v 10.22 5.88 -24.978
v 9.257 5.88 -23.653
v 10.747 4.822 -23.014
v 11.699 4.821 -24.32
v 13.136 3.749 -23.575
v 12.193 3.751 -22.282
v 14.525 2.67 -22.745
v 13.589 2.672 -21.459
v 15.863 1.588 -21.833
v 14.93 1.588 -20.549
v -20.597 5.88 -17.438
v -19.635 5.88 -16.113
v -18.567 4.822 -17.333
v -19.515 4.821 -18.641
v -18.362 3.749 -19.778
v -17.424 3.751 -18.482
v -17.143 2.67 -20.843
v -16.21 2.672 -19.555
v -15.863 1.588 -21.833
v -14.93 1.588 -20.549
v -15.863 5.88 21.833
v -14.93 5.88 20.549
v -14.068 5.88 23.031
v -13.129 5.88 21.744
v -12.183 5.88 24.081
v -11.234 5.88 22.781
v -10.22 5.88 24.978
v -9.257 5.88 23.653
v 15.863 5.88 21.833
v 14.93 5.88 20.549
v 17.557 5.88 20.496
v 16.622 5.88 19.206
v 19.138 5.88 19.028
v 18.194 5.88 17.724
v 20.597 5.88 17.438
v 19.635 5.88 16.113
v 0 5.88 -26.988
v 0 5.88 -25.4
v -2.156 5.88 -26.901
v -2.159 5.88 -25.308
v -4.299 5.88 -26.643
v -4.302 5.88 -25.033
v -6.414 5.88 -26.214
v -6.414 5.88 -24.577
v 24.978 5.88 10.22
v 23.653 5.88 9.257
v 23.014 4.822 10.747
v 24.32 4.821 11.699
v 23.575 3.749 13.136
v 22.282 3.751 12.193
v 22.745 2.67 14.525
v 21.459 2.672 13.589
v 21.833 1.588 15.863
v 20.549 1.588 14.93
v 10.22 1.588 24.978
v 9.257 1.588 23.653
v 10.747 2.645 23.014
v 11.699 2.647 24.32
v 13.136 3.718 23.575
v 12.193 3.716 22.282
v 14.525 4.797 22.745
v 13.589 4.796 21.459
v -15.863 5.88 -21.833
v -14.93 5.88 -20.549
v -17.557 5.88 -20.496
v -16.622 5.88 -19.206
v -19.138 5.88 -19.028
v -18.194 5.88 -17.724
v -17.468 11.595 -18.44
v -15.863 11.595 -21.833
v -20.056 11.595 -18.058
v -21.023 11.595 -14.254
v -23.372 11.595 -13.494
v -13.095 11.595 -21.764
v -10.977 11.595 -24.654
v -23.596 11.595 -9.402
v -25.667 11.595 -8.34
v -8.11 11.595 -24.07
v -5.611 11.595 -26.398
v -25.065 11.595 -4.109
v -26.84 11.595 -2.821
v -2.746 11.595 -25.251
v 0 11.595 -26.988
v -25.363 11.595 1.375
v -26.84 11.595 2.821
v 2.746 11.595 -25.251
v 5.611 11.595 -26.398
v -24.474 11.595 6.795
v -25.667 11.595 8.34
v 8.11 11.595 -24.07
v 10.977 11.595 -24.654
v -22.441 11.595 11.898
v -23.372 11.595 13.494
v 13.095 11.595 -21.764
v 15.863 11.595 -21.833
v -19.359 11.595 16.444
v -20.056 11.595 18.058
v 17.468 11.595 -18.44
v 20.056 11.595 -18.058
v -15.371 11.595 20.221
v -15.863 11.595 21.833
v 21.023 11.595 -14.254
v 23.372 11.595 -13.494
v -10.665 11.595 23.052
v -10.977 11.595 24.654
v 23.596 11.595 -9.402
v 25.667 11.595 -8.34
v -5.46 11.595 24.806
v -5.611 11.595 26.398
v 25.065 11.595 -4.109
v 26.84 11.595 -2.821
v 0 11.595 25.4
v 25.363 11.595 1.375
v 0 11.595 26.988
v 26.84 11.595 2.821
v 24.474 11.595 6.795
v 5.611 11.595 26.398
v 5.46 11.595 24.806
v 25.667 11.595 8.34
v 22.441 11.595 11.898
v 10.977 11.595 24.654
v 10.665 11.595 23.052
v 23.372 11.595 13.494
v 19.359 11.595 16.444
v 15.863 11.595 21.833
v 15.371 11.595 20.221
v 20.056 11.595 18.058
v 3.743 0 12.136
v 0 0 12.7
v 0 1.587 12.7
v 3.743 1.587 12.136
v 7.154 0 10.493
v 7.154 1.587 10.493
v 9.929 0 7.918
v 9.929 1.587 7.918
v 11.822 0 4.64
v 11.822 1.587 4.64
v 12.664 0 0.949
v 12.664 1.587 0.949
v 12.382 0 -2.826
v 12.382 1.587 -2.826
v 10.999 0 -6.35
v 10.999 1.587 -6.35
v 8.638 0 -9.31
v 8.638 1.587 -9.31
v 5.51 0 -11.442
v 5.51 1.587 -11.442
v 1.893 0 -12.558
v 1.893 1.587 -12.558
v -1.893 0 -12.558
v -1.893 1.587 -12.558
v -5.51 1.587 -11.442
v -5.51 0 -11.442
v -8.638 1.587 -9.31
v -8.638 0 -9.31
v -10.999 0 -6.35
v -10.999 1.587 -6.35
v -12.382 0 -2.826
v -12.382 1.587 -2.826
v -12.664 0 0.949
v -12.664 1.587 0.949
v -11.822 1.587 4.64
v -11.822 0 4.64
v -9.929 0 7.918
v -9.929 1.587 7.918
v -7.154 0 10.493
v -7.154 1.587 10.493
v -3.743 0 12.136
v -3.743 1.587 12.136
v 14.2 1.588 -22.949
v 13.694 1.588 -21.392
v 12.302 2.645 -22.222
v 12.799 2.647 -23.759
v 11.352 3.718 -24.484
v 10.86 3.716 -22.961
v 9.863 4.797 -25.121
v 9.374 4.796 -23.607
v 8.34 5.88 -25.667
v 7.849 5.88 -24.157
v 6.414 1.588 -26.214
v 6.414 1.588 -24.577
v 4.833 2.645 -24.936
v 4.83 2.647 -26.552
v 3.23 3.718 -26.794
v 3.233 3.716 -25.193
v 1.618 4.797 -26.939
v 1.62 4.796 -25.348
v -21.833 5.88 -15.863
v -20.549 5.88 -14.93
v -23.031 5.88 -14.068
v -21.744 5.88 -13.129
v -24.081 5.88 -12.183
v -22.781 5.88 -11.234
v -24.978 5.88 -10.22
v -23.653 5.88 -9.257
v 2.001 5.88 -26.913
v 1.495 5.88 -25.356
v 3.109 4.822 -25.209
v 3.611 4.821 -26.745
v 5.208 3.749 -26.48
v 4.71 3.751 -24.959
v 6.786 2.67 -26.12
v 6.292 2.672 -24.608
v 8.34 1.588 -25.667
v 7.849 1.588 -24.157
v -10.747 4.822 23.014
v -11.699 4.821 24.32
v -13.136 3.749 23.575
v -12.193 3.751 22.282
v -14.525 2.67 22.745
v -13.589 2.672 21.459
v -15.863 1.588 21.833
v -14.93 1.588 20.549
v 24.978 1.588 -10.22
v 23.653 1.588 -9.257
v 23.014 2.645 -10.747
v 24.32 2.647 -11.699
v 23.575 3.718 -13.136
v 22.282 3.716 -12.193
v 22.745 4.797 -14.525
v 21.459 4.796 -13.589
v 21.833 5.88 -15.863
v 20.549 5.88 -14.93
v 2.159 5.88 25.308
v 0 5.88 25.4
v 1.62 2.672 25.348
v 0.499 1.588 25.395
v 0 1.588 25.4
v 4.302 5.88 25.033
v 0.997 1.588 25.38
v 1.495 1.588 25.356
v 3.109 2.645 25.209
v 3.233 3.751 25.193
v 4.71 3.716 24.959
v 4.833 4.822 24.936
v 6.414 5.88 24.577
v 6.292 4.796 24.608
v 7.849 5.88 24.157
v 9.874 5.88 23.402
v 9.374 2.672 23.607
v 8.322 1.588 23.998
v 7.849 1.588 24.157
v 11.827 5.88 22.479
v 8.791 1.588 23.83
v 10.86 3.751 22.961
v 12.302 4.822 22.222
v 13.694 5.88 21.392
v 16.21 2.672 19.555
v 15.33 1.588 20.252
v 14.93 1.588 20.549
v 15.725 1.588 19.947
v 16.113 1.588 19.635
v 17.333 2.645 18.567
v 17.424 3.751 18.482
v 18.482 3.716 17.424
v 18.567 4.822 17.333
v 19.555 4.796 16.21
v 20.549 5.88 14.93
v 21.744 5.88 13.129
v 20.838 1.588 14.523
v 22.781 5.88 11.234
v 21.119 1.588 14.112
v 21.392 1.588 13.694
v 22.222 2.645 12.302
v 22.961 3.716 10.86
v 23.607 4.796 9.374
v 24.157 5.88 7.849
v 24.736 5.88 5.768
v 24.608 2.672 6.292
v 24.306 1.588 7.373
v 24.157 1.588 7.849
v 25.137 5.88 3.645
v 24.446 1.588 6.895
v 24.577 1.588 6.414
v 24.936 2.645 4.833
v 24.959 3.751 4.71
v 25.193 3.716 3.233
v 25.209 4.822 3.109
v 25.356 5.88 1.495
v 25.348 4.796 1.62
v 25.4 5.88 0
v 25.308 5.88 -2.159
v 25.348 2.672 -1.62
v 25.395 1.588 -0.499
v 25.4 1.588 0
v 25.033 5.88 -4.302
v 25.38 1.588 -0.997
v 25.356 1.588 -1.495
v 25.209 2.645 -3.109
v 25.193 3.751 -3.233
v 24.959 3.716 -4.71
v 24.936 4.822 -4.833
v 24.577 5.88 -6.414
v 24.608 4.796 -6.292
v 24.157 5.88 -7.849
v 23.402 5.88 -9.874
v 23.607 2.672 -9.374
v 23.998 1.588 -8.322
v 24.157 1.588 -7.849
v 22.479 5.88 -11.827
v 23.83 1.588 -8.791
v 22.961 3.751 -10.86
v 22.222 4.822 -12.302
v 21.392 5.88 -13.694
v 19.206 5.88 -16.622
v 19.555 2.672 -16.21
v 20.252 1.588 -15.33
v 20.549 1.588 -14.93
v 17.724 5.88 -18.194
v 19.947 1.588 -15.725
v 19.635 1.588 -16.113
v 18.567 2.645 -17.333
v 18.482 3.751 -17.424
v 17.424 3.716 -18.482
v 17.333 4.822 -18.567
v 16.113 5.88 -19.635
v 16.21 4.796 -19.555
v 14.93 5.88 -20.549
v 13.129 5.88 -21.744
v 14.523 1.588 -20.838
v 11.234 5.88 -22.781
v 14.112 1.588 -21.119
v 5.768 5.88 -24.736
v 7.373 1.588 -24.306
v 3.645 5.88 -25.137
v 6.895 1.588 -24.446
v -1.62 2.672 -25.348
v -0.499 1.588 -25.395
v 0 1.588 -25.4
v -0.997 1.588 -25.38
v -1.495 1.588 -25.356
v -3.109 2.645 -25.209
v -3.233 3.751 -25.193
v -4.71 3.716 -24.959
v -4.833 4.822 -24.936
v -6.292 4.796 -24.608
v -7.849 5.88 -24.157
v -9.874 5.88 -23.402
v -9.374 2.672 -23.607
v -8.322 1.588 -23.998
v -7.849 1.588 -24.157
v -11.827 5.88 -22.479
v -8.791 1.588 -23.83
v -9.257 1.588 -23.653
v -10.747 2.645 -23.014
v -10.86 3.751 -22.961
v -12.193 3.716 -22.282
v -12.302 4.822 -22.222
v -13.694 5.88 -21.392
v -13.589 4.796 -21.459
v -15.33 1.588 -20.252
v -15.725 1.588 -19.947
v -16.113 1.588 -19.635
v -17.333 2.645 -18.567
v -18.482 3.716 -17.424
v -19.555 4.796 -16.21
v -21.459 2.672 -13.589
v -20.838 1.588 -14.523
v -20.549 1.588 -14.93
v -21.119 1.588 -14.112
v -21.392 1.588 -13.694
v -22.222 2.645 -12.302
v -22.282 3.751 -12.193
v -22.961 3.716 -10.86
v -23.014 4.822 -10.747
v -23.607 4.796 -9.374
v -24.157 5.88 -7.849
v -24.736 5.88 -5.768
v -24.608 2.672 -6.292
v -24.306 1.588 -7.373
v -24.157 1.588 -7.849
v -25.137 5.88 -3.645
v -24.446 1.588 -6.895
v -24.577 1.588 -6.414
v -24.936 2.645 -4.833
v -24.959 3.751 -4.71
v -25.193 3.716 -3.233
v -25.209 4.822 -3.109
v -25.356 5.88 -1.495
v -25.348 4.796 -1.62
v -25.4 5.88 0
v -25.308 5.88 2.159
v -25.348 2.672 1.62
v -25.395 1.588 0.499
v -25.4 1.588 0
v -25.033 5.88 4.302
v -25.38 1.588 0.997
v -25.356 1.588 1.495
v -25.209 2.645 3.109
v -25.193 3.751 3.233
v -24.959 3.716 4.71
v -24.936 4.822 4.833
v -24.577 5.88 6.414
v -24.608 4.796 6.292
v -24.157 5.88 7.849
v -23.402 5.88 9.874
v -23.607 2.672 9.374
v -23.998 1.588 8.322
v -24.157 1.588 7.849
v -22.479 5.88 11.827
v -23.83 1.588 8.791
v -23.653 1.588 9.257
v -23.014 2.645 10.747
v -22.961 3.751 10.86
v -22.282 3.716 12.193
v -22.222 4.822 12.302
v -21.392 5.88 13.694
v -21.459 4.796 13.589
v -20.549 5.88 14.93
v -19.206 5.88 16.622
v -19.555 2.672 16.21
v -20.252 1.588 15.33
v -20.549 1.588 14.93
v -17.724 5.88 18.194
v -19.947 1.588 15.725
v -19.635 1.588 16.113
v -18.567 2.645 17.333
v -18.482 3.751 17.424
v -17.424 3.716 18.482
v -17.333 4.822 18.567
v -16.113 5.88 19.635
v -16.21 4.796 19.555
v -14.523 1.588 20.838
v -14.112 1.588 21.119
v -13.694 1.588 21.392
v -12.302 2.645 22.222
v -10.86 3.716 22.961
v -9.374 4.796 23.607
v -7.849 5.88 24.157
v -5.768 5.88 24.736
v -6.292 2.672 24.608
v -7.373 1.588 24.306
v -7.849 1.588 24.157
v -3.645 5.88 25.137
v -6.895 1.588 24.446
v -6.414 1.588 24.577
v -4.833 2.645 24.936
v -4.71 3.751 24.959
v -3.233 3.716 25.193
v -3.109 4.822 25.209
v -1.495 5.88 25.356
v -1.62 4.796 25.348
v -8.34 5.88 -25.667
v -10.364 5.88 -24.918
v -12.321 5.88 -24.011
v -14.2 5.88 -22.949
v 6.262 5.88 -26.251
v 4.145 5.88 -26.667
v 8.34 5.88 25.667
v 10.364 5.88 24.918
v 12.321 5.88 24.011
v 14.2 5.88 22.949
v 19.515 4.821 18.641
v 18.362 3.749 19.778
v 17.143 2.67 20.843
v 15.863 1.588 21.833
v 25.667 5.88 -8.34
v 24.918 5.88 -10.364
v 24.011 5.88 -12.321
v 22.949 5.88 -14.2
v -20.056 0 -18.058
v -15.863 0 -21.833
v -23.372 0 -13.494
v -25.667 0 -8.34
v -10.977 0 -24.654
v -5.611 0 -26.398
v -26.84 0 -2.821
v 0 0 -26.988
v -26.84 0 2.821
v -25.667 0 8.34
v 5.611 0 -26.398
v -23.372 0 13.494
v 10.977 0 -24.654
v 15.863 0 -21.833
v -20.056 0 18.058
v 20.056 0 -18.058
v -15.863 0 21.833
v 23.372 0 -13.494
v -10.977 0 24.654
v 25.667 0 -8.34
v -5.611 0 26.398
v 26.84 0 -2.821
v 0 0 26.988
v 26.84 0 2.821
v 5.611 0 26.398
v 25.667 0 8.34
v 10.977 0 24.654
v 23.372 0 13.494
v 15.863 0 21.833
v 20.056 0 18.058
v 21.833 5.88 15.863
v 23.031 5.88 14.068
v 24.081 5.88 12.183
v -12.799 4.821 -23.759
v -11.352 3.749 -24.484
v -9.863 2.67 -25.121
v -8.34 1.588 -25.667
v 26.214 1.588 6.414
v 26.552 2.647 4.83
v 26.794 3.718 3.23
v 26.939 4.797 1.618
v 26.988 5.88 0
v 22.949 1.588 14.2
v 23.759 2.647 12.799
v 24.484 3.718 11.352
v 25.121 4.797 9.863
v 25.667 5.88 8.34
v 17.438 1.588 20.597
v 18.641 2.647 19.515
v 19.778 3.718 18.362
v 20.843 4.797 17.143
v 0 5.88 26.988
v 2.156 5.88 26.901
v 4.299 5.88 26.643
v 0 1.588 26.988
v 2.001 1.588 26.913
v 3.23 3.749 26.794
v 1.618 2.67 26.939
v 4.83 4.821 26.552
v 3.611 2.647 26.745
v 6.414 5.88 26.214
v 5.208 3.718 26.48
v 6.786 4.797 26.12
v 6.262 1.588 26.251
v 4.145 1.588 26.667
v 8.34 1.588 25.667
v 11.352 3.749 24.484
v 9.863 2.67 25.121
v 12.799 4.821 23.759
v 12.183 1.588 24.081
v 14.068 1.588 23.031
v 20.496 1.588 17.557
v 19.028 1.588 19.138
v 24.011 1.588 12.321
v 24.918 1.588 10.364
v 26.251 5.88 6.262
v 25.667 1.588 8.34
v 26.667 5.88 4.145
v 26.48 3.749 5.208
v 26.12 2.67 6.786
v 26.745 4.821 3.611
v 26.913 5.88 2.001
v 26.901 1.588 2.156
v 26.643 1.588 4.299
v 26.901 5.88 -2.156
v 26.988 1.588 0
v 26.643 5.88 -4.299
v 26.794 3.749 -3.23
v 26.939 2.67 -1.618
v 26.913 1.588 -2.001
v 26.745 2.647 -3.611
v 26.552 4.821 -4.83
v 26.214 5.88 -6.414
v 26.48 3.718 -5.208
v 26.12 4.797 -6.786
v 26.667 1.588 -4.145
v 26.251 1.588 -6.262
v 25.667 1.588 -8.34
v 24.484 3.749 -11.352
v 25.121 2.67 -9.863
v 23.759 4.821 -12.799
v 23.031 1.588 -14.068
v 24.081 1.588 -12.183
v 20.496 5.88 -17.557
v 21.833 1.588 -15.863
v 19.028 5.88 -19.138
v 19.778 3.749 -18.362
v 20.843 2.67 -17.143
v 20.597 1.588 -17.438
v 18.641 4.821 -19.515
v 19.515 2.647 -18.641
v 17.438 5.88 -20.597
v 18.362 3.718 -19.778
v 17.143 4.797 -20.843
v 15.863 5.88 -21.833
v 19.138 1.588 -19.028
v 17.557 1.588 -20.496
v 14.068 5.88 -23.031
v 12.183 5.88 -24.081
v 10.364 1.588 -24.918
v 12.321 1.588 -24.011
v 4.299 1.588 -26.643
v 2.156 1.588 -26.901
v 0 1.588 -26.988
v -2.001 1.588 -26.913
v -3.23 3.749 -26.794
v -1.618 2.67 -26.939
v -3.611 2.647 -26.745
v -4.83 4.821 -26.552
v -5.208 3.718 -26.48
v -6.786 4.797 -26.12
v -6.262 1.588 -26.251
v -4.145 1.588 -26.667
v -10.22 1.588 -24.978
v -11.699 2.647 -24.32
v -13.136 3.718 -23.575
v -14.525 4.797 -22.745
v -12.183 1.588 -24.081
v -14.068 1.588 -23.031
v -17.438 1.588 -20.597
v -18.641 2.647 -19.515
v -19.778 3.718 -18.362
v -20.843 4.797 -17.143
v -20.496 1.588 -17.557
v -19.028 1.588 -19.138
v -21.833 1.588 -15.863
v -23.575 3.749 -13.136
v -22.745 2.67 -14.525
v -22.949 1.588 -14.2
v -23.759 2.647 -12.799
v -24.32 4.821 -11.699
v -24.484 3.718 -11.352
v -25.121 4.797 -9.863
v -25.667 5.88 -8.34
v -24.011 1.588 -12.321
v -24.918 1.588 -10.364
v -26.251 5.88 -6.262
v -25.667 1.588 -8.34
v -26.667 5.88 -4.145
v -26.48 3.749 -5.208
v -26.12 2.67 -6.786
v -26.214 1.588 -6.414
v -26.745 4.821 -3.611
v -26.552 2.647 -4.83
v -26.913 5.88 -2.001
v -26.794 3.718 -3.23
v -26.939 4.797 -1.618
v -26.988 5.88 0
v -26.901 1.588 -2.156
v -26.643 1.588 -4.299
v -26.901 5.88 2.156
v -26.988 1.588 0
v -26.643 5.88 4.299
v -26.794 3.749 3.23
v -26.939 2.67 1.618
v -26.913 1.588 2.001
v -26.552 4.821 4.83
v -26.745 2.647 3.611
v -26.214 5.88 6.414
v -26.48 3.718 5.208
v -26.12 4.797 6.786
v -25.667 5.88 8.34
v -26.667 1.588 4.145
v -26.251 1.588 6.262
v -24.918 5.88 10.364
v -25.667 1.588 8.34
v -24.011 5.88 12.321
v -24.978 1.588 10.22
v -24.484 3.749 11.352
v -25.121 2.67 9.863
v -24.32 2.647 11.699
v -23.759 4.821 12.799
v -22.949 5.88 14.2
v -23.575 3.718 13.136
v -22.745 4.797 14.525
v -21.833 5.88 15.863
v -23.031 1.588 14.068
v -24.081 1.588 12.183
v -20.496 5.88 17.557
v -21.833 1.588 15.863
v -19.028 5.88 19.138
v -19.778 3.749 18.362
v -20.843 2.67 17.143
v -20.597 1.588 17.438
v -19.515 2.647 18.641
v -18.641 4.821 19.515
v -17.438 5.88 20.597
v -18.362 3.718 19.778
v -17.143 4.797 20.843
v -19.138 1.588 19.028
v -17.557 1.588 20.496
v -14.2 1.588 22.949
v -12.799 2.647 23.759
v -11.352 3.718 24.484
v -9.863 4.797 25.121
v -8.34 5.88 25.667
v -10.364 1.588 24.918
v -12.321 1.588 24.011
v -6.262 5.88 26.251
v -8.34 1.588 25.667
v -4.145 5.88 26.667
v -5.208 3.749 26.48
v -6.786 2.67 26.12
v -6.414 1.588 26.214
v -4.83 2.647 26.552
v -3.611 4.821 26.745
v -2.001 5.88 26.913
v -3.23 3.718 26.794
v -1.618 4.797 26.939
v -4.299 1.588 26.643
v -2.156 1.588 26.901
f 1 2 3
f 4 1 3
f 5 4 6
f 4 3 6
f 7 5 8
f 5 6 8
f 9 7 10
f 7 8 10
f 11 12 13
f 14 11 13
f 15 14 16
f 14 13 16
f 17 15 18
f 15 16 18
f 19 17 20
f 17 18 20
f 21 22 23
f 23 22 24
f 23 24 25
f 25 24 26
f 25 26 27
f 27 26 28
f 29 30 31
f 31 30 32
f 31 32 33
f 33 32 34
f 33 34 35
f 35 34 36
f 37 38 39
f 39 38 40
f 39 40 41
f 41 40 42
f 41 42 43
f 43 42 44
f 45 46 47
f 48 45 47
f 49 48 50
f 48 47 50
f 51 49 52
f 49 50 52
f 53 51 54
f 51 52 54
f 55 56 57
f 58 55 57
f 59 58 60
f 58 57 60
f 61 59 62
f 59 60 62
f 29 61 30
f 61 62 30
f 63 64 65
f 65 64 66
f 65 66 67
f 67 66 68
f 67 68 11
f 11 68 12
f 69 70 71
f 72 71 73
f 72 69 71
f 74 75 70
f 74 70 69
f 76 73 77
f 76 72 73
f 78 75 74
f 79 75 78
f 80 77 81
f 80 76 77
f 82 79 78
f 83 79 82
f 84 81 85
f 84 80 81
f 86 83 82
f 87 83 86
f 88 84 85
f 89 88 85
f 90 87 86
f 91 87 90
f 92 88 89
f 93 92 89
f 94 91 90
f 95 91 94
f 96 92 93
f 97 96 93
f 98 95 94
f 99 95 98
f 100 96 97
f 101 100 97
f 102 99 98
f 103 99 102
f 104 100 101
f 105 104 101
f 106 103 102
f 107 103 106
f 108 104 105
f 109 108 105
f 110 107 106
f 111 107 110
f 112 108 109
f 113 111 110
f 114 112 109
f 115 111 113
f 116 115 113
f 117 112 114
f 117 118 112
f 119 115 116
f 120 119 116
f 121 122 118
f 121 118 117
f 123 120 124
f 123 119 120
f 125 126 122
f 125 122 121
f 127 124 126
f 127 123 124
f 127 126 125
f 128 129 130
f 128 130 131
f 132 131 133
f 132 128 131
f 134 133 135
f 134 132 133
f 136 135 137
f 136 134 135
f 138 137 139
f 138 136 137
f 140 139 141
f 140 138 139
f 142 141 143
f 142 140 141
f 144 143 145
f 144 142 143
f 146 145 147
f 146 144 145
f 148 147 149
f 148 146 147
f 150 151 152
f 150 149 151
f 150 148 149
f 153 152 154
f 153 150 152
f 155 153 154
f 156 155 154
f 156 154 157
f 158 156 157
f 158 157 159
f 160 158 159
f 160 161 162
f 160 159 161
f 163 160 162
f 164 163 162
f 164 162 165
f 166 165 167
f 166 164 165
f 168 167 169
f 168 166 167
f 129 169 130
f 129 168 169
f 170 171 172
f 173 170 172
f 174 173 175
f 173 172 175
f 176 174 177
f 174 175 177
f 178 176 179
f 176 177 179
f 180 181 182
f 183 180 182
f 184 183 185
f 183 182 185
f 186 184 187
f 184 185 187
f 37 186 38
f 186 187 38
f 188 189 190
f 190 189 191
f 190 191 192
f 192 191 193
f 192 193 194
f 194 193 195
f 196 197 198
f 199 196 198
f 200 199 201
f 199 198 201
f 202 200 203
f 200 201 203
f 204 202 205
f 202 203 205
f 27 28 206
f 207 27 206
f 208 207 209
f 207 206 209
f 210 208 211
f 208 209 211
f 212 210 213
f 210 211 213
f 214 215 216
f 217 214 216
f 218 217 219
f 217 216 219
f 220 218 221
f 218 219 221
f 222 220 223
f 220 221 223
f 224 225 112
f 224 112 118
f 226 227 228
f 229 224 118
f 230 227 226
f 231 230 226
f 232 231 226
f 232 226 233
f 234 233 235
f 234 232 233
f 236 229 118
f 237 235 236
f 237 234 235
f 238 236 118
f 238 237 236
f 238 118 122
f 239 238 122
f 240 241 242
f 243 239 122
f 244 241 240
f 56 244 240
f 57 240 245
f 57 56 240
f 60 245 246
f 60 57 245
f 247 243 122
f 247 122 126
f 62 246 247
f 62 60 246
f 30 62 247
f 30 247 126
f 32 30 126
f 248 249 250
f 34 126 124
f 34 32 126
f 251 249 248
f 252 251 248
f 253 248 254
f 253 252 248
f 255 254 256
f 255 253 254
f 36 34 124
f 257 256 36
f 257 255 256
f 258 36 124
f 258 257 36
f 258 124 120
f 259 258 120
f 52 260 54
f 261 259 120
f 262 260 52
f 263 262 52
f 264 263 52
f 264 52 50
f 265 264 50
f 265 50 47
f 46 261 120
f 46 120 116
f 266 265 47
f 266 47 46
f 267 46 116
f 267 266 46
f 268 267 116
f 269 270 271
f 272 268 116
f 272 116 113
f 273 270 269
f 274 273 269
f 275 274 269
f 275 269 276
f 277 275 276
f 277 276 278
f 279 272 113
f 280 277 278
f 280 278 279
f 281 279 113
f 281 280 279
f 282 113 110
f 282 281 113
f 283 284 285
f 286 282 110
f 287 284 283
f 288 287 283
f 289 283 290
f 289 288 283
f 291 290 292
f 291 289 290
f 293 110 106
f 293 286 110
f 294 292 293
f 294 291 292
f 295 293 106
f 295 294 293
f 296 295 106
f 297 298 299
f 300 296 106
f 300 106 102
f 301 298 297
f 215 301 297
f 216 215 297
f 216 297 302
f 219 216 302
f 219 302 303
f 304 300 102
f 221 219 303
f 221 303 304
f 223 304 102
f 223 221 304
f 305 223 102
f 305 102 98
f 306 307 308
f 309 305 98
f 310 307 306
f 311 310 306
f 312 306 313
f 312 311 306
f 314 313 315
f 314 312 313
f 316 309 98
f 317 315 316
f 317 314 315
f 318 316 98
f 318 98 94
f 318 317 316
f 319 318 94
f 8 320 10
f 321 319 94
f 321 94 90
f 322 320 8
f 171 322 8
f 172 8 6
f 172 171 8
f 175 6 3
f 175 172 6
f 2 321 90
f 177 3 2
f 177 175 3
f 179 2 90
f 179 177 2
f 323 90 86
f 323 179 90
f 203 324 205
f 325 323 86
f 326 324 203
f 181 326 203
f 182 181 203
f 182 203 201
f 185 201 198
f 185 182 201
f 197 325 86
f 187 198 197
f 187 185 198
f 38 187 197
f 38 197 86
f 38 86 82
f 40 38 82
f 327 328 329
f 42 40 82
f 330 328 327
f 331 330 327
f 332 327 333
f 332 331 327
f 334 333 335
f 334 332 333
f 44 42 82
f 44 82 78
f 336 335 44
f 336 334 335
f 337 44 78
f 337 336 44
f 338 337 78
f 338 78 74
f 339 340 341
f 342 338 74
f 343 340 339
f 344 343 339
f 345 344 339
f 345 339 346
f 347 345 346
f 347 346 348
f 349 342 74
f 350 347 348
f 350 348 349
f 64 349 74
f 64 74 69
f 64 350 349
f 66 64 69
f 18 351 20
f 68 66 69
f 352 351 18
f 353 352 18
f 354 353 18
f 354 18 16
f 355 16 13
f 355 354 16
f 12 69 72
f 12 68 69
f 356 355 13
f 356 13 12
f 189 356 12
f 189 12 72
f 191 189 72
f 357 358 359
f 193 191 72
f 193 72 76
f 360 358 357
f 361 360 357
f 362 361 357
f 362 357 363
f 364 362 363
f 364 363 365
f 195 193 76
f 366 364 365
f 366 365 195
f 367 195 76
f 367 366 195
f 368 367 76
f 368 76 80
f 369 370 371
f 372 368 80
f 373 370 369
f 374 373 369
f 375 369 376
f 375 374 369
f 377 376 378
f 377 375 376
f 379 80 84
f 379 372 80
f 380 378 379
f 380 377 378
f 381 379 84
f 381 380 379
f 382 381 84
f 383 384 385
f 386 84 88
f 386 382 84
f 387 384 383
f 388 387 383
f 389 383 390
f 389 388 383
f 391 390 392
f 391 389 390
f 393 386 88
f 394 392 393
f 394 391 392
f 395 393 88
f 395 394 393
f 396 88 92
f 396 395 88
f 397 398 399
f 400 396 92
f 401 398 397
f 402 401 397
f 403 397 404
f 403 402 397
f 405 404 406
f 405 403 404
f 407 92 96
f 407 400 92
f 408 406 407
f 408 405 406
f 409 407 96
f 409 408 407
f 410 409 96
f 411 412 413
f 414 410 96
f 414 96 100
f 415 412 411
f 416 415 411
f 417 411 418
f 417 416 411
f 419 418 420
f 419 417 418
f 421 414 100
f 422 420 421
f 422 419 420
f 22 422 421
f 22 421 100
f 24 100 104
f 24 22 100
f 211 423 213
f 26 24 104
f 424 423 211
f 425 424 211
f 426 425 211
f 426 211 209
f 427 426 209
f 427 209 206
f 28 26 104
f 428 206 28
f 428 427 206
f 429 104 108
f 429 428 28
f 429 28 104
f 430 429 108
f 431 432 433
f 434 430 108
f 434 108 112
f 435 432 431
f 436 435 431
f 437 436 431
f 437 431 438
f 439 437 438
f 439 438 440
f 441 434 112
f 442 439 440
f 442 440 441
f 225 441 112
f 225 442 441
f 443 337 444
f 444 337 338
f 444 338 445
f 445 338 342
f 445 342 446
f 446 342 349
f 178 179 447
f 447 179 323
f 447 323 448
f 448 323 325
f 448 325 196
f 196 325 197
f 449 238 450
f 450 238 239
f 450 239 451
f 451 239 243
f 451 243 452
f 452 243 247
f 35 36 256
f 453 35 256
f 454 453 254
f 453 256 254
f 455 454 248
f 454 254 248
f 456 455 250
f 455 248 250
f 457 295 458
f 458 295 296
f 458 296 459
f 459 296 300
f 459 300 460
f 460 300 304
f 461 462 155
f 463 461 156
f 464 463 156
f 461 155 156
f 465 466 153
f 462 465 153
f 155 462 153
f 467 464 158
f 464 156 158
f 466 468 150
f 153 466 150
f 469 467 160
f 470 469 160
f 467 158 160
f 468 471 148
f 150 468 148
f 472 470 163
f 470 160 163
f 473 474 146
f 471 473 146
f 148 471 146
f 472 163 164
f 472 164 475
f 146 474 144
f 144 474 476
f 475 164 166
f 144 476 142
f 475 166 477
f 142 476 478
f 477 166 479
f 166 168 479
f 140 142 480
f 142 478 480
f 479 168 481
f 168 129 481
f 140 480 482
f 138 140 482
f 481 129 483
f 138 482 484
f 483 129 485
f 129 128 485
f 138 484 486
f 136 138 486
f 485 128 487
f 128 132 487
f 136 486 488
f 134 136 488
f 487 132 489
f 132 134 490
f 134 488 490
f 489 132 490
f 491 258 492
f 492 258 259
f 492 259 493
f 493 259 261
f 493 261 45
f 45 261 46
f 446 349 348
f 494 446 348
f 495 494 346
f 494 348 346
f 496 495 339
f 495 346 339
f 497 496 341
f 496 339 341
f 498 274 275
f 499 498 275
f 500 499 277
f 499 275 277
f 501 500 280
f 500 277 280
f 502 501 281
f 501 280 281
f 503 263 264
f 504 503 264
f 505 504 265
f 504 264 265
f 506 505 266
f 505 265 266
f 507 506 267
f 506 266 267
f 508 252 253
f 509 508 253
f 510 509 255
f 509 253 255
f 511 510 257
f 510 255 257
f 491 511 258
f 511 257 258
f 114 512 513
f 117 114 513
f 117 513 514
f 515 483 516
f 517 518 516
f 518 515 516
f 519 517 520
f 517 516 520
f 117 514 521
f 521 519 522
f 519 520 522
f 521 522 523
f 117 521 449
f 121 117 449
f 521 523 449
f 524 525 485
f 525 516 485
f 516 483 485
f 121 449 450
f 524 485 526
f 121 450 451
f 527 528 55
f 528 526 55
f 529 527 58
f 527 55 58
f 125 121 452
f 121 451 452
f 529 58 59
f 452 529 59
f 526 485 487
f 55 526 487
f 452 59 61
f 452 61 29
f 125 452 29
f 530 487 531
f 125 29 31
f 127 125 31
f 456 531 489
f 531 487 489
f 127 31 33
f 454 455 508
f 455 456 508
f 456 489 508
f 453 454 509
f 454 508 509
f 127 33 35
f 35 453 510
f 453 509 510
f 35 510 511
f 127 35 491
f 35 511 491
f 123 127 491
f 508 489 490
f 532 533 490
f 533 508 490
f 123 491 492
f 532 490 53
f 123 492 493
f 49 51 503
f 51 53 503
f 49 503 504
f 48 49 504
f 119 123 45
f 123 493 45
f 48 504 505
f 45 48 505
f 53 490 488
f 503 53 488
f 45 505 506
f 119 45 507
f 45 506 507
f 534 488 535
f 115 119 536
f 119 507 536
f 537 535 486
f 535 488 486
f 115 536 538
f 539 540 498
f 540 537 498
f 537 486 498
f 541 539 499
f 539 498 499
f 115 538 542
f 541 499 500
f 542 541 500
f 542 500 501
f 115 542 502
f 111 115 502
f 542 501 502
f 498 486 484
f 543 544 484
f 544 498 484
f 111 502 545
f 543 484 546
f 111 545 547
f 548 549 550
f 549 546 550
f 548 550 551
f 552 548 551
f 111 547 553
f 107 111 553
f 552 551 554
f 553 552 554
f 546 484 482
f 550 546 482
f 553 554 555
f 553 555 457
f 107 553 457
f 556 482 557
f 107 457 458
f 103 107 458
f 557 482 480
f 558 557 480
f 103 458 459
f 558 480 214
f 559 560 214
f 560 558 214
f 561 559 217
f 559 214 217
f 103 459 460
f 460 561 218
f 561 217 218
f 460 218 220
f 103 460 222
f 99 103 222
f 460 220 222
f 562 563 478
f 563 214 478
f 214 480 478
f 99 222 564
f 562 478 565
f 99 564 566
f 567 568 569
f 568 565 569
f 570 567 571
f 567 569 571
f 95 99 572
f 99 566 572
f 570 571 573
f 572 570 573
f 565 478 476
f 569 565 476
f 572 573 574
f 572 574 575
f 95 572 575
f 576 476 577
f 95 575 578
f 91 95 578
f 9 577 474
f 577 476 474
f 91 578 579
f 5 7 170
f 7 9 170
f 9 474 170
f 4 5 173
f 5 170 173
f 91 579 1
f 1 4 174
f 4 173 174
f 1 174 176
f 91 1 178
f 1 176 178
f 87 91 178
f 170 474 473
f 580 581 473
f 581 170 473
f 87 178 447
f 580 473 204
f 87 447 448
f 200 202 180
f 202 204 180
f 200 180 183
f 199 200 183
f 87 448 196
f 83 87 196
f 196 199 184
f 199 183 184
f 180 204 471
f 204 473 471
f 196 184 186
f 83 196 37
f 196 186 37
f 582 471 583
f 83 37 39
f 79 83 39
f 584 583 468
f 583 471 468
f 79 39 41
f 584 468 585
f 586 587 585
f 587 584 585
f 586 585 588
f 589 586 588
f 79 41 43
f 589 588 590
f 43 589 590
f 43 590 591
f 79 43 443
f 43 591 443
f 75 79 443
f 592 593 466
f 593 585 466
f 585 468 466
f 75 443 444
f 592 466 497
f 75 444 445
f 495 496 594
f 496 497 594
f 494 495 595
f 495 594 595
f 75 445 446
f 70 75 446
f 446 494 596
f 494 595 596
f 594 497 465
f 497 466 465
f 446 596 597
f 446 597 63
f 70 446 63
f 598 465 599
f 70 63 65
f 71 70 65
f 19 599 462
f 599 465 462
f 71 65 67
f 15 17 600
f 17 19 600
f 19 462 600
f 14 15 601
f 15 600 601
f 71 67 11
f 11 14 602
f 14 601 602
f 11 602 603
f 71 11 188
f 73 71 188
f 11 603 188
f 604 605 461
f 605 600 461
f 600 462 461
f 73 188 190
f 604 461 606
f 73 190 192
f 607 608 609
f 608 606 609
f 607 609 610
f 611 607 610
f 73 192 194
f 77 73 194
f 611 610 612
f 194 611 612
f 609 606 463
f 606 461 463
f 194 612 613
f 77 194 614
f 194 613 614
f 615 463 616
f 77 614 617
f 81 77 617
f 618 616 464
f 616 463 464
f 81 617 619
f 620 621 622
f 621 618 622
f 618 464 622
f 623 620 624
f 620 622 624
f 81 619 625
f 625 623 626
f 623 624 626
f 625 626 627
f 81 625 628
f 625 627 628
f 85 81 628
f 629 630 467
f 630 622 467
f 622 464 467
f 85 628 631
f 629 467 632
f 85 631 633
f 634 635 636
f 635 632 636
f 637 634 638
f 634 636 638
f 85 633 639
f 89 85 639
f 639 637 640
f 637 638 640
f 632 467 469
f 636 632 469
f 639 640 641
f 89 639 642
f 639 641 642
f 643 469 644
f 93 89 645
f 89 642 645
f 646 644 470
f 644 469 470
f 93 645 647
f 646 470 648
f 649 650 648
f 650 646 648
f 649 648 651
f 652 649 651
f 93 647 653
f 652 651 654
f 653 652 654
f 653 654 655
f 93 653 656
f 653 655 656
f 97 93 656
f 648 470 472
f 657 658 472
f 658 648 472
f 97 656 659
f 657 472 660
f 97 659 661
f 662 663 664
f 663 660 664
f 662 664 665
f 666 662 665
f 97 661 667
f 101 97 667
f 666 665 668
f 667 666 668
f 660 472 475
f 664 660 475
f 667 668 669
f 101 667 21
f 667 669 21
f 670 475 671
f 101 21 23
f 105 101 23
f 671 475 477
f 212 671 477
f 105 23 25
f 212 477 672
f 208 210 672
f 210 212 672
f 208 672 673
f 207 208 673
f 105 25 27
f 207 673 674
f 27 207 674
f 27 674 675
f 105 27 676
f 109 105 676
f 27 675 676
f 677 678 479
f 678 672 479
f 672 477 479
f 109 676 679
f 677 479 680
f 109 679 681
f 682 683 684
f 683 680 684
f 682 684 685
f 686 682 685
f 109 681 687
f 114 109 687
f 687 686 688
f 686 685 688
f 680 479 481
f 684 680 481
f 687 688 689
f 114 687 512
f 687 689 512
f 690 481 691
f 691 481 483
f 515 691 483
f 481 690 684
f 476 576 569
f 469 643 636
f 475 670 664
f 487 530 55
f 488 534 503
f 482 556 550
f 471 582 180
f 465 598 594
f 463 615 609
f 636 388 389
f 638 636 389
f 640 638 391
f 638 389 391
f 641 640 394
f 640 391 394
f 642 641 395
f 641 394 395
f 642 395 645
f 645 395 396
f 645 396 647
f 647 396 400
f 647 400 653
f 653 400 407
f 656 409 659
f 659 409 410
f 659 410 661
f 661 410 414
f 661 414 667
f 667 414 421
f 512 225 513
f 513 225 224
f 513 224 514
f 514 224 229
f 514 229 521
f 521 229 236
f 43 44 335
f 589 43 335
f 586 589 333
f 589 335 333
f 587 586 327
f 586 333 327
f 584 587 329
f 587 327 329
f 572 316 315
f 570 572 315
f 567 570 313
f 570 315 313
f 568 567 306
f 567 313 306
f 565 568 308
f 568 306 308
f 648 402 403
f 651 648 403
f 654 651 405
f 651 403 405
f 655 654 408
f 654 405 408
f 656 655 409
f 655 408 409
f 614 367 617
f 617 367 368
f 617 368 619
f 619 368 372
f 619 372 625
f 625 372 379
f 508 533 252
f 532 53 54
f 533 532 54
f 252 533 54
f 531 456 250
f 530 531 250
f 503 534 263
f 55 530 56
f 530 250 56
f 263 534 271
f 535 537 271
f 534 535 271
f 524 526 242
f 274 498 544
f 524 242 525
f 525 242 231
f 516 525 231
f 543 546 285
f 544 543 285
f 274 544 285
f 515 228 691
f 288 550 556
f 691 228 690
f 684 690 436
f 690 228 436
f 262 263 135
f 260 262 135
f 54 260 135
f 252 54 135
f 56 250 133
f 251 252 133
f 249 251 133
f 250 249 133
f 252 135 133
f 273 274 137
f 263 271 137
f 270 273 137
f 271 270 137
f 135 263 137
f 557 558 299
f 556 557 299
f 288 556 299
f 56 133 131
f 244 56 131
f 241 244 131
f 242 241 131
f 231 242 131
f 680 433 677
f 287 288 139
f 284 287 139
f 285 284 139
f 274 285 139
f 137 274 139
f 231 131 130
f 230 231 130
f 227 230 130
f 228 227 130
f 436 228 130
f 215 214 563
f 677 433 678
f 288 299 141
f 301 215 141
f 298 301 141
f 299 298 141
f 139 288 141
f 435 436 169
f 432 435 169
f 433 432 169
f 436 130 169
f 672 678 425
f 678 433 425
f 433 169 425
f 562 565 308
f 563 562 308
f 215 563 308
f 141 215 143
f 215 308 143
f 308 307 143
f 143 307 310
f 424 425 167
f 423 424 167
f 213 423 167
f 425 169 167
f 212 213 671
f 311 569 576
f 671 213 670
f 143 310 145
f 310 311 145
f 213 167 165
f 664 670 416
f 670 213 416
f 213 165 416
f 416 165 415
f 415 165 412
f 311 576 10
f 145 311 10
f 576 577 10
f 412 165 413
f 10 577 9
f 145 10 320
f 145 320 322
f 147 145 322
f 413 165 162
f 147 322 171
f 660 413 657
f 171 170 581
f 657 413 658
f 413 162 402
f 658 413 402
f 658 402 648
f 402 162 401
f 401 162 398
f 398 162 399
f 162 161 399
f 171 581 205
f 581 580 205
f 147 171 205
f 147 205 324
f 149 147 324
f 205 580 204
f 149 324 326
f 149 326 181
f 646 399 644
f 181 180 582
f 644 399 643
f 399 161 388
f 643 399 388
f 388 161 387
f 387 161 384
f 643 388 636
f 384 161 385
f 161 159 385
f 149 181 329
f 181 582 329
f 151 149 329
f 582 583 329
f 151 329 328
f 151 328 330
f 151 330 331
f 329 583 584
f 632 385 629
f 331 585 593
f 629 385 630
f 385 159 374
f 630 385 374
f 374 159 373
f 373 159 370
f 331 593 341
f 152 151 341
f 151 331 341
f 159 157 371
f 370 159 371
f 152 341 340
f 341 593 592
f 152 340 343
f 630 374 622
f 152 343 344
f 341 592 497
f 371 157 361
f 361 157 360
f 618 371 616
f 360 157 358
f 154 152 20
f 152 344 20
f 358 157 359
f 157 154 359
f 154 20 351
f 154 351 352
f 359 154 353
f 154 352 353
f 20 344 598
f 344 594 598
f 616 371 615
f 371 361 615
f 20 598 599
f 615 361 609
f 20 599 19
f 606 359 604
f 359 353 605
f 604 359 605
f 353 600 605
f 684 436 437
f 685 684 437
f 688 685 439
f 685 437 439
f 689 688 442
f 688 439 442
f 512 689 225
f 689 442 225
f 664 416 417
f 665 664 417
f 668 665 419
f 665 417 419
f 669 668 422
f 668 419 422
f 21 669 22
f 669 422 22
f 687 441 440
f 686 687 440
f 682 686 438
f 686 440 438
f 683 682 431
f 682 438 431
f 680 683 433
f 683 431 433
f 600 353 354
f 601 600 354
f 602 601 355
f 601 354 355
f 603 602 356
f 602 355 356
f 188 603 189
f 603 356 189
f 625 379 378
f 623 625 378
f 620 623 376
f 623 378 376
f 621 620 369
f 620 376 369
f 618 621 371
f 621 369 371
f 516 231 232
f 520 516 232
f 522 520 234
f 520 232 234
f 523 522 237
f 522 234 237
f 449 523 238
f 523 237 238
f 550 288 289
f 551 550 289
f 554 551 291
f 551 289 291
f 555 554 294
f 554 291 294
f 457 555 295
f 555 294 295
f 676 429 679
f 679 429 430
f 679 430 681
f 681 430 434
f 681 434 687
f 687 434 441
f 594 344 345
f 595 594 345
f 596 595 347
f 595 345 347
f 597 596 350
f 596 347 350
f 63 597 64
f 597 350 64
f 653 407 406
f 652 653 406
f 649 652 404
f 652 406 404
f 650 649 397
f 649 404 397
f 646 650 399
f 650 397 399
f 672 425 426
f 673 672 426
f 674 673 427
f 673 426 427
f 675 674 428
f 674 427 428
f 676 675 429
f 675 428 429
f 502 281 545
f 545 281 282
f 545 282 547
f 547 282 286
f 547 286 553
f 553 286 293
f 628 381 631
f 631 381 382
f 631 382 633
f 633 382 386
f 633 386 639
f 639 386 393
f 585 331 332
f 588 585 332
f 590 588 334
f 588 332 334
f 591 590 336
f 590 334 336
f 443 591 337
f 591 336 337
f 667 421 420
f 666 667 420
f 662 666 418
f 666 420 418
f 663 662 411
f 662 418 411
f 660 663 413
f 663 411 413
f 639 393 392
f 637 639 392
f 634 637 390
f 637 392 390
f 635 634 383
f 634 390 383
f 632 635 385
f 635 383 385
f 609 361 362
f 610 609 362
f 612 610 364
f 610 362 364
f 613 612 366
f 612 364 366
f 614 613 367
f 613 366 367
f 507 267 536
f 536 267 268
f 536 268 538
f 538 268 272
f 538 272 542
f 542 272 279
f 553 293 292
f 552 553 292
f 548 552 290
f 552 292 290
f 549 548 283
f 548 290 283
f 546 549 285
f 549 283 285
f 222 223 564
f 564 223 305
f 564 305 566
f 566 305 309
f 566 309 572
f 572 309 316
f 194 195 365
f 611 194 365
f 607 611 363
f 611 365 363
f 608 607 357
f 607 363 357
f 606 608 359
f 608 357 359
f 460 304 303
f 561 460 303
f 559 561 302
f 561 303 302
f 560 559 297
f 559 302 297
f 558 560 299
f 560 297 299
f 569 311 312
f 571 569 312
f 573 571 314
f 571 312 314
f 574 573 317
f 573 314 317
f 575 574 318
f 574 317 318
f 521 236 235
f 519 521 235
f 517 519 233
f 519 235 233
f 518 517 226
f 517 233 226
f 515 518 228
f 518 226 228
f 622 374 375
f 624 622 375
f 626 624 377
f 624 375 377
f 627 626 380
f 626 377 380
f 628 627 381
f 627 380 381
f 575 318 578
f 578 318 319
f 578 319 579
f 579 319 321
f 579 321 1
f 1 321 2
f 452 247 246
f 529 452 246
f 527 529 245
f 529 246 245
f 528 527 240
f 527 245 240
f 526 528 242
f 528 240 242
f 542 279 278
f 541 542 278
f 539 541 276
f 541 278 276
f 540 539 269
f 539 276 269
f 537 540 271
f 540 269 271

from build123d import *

# Parameters (mm, degrees)
SKETCH2_R               = 26.9875
BOSS_EXTRUDE1_DEPTH     = 11.5951
SHELL1_T                = -1.5875
CUT_EXTRUDE1_DEPTH      = 40.456334983
CUT_EXTRUDE1_DEPTH_BACK = 40.456334983
SKETCH5_R               = 12.7
CUT_EXTRUDE2_DEPTH      = 38.1
CIRPATTERN3_COUNT       = 20


with BuildPart() as part:
    # Sketch2 → Boss-Extrude1 (new body)
    with BuildSketch(Plane(origin=(0, 0, 0), x_dir=(1, 0, 0), z_dir=(0, 1, 0))):
        Circle(SKETCH2_R)
    extrude(amount=BOSS_EXTRUDE1_DEPTH)

    # Shell1
    shell1_openings = [part.faces().sort_by_distance(p)[0] for p in [
        (0, 11.5951, 0),
    ]]
    offset(amount=SHELL1_T, openings=shell1_openings, kind=Kind.INTERSECTION)

    # Sketch5 → Cut-Extrude1 (cut, two sides: drawn at the far end of the back side and taken through both)
    with BuildSketch(Plane(origin=(0, 1.5875, 0), x_dir=(1, 0, 0), z_dir=(0, 1, 0)).offset(-CUT_EXTRUDE1_DEPTH_BACK)):
        Circle(SKETCH5_R)
    extrude(amount=CUT_EXTRUDE1_DEPTH + CUT_EXTRUDE1_DEPTH_BACK, mode=Mode.SUBTRACT)

    # Sketch6 → Cut-Extrude2 (cut)
    with BuildSketch(Plane.XY):
        Polygon((6.413577678, 1.5875), (0, 5.8801), (-6.413577678, 5.8801), (0, 1.5875), align=None)
    cut_extrude2 = extrude(amount=-CUT_EXTRUDE2_DEPTH, mode=Mode.SUBTRACT)

    # CirPattern3: Cut-Extrude2 ×20 about axis
    cirpattern3_axis = Axis((0, 11.5951, 0), (0, -1, 0))
    for i in range(1, CIRPATTERN3_COUNT):
        add(cut_extrude2.rotate(cirpattern3_axis, i * 360 / CIRPATTERN3_COUNT), mode=Mode.SUBTRACT)


solid = part.part
